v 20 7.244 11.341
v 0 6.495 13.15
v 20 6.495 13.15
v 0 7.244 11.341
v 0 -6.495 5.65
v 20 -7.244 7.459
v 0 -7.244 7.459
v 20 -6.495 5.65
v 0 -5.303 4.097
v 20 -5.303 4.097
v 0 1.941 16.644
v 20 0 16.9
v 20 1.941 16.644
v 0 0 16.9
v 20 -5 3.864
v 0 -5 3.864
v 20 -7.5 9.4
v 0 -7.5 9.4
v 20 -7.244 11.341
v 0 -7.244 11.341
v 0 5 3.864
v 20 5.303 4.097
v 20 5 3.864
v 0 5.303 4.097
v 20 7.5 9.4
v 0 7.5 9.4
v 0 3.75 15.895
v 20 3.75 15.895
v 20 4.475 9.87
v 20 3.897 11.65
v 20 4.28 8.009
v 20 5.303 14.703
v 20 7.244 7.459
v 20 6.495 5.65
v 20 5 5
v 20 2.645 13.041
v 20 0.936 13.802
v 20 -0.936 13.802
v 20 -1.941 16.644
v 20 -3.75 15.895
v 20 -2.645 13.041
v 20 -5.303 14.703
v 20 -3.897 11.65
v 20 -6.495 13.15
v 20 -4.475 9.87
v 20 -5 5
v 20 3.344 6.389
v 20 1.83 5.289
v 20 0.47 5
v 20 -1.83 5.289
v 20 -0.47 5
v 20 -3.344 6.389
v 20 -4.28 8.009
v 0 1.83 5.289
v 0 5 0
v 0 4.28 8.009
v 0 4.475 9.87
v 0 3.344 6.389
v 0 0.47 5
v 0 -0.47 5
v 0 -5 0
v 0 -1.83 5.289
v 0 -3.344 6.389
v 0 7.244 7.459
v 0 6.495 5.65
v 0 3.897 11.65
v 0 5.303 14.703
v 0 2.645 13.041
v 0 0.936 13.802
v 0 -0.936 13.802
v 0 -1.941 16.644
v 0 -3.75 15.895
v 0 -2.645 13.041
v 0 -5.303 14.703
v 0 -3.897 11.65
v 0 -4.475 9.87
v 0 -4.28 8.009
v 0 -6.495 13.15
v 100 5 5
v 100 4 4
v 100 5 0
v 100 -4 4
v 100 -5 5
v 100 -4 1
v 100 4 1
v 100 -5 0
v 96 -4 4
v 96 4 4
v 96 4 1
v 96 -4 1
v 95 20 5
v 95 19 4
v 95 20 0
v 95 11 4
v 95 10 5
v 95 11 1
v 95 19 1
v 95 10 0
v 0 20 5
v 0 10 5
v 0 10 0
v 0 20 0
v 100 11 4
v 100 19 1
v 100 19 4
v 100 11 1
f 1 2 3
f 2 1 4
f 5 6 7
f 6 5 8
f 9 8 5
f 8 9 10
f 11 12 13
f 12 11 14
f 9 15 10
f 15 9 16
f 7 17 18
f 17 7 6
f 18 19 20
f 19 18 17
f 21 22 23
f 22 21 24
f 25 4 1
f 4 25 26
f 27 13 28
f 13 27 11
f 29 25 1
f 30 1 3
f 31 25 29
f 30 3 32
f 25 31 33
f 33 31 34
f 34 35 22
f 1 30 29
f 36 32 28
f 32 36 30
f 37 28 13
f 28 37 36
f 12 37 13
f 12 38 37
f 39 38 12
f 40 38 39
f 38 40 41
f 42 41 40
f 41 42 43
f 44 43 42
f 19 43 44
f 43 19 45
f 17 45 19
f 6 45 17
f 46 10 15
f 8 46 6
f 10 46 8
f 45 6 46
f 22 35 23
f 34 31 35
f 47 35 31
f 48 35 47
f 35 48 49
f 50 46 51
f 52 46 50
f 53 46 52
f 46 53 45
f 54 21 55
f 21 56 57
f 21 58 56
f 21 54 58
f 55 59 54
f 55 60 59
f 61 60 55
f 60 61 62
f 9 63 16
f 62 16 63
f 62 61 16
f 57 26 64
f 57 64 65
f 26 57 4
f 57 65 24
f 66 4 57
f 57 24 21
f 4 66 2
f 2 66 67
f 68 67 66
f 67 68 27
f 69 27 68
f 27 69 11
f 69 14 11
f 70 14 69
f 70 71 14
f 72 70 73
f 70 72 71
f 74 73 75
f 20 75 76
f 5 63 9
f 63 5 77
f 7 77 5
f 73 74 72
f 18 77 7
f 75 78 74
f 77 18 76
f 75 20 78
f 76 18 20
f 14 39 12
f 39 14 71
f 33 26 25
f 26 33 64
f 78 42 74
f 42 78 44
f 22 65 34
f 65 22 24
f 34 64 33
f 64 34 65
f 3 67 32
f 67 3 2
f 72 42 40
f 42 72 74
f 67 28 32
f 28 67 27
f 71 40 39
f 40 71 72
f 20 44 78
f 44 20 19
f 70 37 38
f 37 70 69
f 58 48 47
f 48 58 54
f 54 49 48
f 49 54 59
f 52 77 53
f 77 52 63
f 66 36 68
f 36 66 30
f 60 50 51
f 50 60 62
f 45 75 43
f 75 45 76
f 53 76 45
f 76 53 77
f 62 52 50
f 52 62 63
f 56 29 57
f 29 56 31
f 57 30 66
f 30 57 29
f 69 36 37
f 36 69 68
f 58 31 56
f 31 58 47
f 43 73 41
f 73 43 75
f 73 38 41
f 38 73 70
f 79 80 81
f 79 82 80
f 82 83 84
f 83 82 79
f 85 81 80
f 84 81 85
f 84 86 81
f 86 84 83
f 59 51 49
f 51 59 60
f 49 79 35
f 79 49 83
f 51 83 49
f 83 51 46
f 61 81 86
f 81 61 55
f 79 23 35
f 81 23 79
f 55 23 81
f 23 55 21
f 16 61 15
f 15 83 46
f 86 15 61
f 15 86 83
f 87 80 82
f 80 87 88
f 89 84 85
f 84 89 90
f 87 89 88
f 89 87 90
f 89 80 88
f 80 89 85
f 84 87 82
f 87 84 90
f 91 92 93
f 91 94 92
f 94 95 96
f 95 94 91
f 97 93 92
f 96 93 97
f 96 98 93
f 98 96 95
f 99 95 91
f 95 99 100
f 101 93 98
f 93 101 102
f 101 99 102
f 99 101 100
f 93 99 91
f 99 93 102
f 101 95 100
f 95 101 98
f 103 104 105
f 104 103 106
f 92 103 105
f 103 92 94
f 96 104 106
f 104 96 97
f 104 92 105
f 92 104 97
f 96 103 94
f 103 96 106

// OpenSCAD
translate ([0,0,9.4])
rotate([0,90,0])
difference()
{
	cylinder(h=20,d=15);
	translate([0,0,-2]) cylinder(h=25,d=9);
}
difference()
{
	translate([0,-5,0]) cube([100,10,5]);
	translate([96,-4,1]) cube([5,8,3]);
}
translate([0,10,0]) cube([95,10,5]);
color("red") translate([95,11,1]) cube([5,8,3]);
